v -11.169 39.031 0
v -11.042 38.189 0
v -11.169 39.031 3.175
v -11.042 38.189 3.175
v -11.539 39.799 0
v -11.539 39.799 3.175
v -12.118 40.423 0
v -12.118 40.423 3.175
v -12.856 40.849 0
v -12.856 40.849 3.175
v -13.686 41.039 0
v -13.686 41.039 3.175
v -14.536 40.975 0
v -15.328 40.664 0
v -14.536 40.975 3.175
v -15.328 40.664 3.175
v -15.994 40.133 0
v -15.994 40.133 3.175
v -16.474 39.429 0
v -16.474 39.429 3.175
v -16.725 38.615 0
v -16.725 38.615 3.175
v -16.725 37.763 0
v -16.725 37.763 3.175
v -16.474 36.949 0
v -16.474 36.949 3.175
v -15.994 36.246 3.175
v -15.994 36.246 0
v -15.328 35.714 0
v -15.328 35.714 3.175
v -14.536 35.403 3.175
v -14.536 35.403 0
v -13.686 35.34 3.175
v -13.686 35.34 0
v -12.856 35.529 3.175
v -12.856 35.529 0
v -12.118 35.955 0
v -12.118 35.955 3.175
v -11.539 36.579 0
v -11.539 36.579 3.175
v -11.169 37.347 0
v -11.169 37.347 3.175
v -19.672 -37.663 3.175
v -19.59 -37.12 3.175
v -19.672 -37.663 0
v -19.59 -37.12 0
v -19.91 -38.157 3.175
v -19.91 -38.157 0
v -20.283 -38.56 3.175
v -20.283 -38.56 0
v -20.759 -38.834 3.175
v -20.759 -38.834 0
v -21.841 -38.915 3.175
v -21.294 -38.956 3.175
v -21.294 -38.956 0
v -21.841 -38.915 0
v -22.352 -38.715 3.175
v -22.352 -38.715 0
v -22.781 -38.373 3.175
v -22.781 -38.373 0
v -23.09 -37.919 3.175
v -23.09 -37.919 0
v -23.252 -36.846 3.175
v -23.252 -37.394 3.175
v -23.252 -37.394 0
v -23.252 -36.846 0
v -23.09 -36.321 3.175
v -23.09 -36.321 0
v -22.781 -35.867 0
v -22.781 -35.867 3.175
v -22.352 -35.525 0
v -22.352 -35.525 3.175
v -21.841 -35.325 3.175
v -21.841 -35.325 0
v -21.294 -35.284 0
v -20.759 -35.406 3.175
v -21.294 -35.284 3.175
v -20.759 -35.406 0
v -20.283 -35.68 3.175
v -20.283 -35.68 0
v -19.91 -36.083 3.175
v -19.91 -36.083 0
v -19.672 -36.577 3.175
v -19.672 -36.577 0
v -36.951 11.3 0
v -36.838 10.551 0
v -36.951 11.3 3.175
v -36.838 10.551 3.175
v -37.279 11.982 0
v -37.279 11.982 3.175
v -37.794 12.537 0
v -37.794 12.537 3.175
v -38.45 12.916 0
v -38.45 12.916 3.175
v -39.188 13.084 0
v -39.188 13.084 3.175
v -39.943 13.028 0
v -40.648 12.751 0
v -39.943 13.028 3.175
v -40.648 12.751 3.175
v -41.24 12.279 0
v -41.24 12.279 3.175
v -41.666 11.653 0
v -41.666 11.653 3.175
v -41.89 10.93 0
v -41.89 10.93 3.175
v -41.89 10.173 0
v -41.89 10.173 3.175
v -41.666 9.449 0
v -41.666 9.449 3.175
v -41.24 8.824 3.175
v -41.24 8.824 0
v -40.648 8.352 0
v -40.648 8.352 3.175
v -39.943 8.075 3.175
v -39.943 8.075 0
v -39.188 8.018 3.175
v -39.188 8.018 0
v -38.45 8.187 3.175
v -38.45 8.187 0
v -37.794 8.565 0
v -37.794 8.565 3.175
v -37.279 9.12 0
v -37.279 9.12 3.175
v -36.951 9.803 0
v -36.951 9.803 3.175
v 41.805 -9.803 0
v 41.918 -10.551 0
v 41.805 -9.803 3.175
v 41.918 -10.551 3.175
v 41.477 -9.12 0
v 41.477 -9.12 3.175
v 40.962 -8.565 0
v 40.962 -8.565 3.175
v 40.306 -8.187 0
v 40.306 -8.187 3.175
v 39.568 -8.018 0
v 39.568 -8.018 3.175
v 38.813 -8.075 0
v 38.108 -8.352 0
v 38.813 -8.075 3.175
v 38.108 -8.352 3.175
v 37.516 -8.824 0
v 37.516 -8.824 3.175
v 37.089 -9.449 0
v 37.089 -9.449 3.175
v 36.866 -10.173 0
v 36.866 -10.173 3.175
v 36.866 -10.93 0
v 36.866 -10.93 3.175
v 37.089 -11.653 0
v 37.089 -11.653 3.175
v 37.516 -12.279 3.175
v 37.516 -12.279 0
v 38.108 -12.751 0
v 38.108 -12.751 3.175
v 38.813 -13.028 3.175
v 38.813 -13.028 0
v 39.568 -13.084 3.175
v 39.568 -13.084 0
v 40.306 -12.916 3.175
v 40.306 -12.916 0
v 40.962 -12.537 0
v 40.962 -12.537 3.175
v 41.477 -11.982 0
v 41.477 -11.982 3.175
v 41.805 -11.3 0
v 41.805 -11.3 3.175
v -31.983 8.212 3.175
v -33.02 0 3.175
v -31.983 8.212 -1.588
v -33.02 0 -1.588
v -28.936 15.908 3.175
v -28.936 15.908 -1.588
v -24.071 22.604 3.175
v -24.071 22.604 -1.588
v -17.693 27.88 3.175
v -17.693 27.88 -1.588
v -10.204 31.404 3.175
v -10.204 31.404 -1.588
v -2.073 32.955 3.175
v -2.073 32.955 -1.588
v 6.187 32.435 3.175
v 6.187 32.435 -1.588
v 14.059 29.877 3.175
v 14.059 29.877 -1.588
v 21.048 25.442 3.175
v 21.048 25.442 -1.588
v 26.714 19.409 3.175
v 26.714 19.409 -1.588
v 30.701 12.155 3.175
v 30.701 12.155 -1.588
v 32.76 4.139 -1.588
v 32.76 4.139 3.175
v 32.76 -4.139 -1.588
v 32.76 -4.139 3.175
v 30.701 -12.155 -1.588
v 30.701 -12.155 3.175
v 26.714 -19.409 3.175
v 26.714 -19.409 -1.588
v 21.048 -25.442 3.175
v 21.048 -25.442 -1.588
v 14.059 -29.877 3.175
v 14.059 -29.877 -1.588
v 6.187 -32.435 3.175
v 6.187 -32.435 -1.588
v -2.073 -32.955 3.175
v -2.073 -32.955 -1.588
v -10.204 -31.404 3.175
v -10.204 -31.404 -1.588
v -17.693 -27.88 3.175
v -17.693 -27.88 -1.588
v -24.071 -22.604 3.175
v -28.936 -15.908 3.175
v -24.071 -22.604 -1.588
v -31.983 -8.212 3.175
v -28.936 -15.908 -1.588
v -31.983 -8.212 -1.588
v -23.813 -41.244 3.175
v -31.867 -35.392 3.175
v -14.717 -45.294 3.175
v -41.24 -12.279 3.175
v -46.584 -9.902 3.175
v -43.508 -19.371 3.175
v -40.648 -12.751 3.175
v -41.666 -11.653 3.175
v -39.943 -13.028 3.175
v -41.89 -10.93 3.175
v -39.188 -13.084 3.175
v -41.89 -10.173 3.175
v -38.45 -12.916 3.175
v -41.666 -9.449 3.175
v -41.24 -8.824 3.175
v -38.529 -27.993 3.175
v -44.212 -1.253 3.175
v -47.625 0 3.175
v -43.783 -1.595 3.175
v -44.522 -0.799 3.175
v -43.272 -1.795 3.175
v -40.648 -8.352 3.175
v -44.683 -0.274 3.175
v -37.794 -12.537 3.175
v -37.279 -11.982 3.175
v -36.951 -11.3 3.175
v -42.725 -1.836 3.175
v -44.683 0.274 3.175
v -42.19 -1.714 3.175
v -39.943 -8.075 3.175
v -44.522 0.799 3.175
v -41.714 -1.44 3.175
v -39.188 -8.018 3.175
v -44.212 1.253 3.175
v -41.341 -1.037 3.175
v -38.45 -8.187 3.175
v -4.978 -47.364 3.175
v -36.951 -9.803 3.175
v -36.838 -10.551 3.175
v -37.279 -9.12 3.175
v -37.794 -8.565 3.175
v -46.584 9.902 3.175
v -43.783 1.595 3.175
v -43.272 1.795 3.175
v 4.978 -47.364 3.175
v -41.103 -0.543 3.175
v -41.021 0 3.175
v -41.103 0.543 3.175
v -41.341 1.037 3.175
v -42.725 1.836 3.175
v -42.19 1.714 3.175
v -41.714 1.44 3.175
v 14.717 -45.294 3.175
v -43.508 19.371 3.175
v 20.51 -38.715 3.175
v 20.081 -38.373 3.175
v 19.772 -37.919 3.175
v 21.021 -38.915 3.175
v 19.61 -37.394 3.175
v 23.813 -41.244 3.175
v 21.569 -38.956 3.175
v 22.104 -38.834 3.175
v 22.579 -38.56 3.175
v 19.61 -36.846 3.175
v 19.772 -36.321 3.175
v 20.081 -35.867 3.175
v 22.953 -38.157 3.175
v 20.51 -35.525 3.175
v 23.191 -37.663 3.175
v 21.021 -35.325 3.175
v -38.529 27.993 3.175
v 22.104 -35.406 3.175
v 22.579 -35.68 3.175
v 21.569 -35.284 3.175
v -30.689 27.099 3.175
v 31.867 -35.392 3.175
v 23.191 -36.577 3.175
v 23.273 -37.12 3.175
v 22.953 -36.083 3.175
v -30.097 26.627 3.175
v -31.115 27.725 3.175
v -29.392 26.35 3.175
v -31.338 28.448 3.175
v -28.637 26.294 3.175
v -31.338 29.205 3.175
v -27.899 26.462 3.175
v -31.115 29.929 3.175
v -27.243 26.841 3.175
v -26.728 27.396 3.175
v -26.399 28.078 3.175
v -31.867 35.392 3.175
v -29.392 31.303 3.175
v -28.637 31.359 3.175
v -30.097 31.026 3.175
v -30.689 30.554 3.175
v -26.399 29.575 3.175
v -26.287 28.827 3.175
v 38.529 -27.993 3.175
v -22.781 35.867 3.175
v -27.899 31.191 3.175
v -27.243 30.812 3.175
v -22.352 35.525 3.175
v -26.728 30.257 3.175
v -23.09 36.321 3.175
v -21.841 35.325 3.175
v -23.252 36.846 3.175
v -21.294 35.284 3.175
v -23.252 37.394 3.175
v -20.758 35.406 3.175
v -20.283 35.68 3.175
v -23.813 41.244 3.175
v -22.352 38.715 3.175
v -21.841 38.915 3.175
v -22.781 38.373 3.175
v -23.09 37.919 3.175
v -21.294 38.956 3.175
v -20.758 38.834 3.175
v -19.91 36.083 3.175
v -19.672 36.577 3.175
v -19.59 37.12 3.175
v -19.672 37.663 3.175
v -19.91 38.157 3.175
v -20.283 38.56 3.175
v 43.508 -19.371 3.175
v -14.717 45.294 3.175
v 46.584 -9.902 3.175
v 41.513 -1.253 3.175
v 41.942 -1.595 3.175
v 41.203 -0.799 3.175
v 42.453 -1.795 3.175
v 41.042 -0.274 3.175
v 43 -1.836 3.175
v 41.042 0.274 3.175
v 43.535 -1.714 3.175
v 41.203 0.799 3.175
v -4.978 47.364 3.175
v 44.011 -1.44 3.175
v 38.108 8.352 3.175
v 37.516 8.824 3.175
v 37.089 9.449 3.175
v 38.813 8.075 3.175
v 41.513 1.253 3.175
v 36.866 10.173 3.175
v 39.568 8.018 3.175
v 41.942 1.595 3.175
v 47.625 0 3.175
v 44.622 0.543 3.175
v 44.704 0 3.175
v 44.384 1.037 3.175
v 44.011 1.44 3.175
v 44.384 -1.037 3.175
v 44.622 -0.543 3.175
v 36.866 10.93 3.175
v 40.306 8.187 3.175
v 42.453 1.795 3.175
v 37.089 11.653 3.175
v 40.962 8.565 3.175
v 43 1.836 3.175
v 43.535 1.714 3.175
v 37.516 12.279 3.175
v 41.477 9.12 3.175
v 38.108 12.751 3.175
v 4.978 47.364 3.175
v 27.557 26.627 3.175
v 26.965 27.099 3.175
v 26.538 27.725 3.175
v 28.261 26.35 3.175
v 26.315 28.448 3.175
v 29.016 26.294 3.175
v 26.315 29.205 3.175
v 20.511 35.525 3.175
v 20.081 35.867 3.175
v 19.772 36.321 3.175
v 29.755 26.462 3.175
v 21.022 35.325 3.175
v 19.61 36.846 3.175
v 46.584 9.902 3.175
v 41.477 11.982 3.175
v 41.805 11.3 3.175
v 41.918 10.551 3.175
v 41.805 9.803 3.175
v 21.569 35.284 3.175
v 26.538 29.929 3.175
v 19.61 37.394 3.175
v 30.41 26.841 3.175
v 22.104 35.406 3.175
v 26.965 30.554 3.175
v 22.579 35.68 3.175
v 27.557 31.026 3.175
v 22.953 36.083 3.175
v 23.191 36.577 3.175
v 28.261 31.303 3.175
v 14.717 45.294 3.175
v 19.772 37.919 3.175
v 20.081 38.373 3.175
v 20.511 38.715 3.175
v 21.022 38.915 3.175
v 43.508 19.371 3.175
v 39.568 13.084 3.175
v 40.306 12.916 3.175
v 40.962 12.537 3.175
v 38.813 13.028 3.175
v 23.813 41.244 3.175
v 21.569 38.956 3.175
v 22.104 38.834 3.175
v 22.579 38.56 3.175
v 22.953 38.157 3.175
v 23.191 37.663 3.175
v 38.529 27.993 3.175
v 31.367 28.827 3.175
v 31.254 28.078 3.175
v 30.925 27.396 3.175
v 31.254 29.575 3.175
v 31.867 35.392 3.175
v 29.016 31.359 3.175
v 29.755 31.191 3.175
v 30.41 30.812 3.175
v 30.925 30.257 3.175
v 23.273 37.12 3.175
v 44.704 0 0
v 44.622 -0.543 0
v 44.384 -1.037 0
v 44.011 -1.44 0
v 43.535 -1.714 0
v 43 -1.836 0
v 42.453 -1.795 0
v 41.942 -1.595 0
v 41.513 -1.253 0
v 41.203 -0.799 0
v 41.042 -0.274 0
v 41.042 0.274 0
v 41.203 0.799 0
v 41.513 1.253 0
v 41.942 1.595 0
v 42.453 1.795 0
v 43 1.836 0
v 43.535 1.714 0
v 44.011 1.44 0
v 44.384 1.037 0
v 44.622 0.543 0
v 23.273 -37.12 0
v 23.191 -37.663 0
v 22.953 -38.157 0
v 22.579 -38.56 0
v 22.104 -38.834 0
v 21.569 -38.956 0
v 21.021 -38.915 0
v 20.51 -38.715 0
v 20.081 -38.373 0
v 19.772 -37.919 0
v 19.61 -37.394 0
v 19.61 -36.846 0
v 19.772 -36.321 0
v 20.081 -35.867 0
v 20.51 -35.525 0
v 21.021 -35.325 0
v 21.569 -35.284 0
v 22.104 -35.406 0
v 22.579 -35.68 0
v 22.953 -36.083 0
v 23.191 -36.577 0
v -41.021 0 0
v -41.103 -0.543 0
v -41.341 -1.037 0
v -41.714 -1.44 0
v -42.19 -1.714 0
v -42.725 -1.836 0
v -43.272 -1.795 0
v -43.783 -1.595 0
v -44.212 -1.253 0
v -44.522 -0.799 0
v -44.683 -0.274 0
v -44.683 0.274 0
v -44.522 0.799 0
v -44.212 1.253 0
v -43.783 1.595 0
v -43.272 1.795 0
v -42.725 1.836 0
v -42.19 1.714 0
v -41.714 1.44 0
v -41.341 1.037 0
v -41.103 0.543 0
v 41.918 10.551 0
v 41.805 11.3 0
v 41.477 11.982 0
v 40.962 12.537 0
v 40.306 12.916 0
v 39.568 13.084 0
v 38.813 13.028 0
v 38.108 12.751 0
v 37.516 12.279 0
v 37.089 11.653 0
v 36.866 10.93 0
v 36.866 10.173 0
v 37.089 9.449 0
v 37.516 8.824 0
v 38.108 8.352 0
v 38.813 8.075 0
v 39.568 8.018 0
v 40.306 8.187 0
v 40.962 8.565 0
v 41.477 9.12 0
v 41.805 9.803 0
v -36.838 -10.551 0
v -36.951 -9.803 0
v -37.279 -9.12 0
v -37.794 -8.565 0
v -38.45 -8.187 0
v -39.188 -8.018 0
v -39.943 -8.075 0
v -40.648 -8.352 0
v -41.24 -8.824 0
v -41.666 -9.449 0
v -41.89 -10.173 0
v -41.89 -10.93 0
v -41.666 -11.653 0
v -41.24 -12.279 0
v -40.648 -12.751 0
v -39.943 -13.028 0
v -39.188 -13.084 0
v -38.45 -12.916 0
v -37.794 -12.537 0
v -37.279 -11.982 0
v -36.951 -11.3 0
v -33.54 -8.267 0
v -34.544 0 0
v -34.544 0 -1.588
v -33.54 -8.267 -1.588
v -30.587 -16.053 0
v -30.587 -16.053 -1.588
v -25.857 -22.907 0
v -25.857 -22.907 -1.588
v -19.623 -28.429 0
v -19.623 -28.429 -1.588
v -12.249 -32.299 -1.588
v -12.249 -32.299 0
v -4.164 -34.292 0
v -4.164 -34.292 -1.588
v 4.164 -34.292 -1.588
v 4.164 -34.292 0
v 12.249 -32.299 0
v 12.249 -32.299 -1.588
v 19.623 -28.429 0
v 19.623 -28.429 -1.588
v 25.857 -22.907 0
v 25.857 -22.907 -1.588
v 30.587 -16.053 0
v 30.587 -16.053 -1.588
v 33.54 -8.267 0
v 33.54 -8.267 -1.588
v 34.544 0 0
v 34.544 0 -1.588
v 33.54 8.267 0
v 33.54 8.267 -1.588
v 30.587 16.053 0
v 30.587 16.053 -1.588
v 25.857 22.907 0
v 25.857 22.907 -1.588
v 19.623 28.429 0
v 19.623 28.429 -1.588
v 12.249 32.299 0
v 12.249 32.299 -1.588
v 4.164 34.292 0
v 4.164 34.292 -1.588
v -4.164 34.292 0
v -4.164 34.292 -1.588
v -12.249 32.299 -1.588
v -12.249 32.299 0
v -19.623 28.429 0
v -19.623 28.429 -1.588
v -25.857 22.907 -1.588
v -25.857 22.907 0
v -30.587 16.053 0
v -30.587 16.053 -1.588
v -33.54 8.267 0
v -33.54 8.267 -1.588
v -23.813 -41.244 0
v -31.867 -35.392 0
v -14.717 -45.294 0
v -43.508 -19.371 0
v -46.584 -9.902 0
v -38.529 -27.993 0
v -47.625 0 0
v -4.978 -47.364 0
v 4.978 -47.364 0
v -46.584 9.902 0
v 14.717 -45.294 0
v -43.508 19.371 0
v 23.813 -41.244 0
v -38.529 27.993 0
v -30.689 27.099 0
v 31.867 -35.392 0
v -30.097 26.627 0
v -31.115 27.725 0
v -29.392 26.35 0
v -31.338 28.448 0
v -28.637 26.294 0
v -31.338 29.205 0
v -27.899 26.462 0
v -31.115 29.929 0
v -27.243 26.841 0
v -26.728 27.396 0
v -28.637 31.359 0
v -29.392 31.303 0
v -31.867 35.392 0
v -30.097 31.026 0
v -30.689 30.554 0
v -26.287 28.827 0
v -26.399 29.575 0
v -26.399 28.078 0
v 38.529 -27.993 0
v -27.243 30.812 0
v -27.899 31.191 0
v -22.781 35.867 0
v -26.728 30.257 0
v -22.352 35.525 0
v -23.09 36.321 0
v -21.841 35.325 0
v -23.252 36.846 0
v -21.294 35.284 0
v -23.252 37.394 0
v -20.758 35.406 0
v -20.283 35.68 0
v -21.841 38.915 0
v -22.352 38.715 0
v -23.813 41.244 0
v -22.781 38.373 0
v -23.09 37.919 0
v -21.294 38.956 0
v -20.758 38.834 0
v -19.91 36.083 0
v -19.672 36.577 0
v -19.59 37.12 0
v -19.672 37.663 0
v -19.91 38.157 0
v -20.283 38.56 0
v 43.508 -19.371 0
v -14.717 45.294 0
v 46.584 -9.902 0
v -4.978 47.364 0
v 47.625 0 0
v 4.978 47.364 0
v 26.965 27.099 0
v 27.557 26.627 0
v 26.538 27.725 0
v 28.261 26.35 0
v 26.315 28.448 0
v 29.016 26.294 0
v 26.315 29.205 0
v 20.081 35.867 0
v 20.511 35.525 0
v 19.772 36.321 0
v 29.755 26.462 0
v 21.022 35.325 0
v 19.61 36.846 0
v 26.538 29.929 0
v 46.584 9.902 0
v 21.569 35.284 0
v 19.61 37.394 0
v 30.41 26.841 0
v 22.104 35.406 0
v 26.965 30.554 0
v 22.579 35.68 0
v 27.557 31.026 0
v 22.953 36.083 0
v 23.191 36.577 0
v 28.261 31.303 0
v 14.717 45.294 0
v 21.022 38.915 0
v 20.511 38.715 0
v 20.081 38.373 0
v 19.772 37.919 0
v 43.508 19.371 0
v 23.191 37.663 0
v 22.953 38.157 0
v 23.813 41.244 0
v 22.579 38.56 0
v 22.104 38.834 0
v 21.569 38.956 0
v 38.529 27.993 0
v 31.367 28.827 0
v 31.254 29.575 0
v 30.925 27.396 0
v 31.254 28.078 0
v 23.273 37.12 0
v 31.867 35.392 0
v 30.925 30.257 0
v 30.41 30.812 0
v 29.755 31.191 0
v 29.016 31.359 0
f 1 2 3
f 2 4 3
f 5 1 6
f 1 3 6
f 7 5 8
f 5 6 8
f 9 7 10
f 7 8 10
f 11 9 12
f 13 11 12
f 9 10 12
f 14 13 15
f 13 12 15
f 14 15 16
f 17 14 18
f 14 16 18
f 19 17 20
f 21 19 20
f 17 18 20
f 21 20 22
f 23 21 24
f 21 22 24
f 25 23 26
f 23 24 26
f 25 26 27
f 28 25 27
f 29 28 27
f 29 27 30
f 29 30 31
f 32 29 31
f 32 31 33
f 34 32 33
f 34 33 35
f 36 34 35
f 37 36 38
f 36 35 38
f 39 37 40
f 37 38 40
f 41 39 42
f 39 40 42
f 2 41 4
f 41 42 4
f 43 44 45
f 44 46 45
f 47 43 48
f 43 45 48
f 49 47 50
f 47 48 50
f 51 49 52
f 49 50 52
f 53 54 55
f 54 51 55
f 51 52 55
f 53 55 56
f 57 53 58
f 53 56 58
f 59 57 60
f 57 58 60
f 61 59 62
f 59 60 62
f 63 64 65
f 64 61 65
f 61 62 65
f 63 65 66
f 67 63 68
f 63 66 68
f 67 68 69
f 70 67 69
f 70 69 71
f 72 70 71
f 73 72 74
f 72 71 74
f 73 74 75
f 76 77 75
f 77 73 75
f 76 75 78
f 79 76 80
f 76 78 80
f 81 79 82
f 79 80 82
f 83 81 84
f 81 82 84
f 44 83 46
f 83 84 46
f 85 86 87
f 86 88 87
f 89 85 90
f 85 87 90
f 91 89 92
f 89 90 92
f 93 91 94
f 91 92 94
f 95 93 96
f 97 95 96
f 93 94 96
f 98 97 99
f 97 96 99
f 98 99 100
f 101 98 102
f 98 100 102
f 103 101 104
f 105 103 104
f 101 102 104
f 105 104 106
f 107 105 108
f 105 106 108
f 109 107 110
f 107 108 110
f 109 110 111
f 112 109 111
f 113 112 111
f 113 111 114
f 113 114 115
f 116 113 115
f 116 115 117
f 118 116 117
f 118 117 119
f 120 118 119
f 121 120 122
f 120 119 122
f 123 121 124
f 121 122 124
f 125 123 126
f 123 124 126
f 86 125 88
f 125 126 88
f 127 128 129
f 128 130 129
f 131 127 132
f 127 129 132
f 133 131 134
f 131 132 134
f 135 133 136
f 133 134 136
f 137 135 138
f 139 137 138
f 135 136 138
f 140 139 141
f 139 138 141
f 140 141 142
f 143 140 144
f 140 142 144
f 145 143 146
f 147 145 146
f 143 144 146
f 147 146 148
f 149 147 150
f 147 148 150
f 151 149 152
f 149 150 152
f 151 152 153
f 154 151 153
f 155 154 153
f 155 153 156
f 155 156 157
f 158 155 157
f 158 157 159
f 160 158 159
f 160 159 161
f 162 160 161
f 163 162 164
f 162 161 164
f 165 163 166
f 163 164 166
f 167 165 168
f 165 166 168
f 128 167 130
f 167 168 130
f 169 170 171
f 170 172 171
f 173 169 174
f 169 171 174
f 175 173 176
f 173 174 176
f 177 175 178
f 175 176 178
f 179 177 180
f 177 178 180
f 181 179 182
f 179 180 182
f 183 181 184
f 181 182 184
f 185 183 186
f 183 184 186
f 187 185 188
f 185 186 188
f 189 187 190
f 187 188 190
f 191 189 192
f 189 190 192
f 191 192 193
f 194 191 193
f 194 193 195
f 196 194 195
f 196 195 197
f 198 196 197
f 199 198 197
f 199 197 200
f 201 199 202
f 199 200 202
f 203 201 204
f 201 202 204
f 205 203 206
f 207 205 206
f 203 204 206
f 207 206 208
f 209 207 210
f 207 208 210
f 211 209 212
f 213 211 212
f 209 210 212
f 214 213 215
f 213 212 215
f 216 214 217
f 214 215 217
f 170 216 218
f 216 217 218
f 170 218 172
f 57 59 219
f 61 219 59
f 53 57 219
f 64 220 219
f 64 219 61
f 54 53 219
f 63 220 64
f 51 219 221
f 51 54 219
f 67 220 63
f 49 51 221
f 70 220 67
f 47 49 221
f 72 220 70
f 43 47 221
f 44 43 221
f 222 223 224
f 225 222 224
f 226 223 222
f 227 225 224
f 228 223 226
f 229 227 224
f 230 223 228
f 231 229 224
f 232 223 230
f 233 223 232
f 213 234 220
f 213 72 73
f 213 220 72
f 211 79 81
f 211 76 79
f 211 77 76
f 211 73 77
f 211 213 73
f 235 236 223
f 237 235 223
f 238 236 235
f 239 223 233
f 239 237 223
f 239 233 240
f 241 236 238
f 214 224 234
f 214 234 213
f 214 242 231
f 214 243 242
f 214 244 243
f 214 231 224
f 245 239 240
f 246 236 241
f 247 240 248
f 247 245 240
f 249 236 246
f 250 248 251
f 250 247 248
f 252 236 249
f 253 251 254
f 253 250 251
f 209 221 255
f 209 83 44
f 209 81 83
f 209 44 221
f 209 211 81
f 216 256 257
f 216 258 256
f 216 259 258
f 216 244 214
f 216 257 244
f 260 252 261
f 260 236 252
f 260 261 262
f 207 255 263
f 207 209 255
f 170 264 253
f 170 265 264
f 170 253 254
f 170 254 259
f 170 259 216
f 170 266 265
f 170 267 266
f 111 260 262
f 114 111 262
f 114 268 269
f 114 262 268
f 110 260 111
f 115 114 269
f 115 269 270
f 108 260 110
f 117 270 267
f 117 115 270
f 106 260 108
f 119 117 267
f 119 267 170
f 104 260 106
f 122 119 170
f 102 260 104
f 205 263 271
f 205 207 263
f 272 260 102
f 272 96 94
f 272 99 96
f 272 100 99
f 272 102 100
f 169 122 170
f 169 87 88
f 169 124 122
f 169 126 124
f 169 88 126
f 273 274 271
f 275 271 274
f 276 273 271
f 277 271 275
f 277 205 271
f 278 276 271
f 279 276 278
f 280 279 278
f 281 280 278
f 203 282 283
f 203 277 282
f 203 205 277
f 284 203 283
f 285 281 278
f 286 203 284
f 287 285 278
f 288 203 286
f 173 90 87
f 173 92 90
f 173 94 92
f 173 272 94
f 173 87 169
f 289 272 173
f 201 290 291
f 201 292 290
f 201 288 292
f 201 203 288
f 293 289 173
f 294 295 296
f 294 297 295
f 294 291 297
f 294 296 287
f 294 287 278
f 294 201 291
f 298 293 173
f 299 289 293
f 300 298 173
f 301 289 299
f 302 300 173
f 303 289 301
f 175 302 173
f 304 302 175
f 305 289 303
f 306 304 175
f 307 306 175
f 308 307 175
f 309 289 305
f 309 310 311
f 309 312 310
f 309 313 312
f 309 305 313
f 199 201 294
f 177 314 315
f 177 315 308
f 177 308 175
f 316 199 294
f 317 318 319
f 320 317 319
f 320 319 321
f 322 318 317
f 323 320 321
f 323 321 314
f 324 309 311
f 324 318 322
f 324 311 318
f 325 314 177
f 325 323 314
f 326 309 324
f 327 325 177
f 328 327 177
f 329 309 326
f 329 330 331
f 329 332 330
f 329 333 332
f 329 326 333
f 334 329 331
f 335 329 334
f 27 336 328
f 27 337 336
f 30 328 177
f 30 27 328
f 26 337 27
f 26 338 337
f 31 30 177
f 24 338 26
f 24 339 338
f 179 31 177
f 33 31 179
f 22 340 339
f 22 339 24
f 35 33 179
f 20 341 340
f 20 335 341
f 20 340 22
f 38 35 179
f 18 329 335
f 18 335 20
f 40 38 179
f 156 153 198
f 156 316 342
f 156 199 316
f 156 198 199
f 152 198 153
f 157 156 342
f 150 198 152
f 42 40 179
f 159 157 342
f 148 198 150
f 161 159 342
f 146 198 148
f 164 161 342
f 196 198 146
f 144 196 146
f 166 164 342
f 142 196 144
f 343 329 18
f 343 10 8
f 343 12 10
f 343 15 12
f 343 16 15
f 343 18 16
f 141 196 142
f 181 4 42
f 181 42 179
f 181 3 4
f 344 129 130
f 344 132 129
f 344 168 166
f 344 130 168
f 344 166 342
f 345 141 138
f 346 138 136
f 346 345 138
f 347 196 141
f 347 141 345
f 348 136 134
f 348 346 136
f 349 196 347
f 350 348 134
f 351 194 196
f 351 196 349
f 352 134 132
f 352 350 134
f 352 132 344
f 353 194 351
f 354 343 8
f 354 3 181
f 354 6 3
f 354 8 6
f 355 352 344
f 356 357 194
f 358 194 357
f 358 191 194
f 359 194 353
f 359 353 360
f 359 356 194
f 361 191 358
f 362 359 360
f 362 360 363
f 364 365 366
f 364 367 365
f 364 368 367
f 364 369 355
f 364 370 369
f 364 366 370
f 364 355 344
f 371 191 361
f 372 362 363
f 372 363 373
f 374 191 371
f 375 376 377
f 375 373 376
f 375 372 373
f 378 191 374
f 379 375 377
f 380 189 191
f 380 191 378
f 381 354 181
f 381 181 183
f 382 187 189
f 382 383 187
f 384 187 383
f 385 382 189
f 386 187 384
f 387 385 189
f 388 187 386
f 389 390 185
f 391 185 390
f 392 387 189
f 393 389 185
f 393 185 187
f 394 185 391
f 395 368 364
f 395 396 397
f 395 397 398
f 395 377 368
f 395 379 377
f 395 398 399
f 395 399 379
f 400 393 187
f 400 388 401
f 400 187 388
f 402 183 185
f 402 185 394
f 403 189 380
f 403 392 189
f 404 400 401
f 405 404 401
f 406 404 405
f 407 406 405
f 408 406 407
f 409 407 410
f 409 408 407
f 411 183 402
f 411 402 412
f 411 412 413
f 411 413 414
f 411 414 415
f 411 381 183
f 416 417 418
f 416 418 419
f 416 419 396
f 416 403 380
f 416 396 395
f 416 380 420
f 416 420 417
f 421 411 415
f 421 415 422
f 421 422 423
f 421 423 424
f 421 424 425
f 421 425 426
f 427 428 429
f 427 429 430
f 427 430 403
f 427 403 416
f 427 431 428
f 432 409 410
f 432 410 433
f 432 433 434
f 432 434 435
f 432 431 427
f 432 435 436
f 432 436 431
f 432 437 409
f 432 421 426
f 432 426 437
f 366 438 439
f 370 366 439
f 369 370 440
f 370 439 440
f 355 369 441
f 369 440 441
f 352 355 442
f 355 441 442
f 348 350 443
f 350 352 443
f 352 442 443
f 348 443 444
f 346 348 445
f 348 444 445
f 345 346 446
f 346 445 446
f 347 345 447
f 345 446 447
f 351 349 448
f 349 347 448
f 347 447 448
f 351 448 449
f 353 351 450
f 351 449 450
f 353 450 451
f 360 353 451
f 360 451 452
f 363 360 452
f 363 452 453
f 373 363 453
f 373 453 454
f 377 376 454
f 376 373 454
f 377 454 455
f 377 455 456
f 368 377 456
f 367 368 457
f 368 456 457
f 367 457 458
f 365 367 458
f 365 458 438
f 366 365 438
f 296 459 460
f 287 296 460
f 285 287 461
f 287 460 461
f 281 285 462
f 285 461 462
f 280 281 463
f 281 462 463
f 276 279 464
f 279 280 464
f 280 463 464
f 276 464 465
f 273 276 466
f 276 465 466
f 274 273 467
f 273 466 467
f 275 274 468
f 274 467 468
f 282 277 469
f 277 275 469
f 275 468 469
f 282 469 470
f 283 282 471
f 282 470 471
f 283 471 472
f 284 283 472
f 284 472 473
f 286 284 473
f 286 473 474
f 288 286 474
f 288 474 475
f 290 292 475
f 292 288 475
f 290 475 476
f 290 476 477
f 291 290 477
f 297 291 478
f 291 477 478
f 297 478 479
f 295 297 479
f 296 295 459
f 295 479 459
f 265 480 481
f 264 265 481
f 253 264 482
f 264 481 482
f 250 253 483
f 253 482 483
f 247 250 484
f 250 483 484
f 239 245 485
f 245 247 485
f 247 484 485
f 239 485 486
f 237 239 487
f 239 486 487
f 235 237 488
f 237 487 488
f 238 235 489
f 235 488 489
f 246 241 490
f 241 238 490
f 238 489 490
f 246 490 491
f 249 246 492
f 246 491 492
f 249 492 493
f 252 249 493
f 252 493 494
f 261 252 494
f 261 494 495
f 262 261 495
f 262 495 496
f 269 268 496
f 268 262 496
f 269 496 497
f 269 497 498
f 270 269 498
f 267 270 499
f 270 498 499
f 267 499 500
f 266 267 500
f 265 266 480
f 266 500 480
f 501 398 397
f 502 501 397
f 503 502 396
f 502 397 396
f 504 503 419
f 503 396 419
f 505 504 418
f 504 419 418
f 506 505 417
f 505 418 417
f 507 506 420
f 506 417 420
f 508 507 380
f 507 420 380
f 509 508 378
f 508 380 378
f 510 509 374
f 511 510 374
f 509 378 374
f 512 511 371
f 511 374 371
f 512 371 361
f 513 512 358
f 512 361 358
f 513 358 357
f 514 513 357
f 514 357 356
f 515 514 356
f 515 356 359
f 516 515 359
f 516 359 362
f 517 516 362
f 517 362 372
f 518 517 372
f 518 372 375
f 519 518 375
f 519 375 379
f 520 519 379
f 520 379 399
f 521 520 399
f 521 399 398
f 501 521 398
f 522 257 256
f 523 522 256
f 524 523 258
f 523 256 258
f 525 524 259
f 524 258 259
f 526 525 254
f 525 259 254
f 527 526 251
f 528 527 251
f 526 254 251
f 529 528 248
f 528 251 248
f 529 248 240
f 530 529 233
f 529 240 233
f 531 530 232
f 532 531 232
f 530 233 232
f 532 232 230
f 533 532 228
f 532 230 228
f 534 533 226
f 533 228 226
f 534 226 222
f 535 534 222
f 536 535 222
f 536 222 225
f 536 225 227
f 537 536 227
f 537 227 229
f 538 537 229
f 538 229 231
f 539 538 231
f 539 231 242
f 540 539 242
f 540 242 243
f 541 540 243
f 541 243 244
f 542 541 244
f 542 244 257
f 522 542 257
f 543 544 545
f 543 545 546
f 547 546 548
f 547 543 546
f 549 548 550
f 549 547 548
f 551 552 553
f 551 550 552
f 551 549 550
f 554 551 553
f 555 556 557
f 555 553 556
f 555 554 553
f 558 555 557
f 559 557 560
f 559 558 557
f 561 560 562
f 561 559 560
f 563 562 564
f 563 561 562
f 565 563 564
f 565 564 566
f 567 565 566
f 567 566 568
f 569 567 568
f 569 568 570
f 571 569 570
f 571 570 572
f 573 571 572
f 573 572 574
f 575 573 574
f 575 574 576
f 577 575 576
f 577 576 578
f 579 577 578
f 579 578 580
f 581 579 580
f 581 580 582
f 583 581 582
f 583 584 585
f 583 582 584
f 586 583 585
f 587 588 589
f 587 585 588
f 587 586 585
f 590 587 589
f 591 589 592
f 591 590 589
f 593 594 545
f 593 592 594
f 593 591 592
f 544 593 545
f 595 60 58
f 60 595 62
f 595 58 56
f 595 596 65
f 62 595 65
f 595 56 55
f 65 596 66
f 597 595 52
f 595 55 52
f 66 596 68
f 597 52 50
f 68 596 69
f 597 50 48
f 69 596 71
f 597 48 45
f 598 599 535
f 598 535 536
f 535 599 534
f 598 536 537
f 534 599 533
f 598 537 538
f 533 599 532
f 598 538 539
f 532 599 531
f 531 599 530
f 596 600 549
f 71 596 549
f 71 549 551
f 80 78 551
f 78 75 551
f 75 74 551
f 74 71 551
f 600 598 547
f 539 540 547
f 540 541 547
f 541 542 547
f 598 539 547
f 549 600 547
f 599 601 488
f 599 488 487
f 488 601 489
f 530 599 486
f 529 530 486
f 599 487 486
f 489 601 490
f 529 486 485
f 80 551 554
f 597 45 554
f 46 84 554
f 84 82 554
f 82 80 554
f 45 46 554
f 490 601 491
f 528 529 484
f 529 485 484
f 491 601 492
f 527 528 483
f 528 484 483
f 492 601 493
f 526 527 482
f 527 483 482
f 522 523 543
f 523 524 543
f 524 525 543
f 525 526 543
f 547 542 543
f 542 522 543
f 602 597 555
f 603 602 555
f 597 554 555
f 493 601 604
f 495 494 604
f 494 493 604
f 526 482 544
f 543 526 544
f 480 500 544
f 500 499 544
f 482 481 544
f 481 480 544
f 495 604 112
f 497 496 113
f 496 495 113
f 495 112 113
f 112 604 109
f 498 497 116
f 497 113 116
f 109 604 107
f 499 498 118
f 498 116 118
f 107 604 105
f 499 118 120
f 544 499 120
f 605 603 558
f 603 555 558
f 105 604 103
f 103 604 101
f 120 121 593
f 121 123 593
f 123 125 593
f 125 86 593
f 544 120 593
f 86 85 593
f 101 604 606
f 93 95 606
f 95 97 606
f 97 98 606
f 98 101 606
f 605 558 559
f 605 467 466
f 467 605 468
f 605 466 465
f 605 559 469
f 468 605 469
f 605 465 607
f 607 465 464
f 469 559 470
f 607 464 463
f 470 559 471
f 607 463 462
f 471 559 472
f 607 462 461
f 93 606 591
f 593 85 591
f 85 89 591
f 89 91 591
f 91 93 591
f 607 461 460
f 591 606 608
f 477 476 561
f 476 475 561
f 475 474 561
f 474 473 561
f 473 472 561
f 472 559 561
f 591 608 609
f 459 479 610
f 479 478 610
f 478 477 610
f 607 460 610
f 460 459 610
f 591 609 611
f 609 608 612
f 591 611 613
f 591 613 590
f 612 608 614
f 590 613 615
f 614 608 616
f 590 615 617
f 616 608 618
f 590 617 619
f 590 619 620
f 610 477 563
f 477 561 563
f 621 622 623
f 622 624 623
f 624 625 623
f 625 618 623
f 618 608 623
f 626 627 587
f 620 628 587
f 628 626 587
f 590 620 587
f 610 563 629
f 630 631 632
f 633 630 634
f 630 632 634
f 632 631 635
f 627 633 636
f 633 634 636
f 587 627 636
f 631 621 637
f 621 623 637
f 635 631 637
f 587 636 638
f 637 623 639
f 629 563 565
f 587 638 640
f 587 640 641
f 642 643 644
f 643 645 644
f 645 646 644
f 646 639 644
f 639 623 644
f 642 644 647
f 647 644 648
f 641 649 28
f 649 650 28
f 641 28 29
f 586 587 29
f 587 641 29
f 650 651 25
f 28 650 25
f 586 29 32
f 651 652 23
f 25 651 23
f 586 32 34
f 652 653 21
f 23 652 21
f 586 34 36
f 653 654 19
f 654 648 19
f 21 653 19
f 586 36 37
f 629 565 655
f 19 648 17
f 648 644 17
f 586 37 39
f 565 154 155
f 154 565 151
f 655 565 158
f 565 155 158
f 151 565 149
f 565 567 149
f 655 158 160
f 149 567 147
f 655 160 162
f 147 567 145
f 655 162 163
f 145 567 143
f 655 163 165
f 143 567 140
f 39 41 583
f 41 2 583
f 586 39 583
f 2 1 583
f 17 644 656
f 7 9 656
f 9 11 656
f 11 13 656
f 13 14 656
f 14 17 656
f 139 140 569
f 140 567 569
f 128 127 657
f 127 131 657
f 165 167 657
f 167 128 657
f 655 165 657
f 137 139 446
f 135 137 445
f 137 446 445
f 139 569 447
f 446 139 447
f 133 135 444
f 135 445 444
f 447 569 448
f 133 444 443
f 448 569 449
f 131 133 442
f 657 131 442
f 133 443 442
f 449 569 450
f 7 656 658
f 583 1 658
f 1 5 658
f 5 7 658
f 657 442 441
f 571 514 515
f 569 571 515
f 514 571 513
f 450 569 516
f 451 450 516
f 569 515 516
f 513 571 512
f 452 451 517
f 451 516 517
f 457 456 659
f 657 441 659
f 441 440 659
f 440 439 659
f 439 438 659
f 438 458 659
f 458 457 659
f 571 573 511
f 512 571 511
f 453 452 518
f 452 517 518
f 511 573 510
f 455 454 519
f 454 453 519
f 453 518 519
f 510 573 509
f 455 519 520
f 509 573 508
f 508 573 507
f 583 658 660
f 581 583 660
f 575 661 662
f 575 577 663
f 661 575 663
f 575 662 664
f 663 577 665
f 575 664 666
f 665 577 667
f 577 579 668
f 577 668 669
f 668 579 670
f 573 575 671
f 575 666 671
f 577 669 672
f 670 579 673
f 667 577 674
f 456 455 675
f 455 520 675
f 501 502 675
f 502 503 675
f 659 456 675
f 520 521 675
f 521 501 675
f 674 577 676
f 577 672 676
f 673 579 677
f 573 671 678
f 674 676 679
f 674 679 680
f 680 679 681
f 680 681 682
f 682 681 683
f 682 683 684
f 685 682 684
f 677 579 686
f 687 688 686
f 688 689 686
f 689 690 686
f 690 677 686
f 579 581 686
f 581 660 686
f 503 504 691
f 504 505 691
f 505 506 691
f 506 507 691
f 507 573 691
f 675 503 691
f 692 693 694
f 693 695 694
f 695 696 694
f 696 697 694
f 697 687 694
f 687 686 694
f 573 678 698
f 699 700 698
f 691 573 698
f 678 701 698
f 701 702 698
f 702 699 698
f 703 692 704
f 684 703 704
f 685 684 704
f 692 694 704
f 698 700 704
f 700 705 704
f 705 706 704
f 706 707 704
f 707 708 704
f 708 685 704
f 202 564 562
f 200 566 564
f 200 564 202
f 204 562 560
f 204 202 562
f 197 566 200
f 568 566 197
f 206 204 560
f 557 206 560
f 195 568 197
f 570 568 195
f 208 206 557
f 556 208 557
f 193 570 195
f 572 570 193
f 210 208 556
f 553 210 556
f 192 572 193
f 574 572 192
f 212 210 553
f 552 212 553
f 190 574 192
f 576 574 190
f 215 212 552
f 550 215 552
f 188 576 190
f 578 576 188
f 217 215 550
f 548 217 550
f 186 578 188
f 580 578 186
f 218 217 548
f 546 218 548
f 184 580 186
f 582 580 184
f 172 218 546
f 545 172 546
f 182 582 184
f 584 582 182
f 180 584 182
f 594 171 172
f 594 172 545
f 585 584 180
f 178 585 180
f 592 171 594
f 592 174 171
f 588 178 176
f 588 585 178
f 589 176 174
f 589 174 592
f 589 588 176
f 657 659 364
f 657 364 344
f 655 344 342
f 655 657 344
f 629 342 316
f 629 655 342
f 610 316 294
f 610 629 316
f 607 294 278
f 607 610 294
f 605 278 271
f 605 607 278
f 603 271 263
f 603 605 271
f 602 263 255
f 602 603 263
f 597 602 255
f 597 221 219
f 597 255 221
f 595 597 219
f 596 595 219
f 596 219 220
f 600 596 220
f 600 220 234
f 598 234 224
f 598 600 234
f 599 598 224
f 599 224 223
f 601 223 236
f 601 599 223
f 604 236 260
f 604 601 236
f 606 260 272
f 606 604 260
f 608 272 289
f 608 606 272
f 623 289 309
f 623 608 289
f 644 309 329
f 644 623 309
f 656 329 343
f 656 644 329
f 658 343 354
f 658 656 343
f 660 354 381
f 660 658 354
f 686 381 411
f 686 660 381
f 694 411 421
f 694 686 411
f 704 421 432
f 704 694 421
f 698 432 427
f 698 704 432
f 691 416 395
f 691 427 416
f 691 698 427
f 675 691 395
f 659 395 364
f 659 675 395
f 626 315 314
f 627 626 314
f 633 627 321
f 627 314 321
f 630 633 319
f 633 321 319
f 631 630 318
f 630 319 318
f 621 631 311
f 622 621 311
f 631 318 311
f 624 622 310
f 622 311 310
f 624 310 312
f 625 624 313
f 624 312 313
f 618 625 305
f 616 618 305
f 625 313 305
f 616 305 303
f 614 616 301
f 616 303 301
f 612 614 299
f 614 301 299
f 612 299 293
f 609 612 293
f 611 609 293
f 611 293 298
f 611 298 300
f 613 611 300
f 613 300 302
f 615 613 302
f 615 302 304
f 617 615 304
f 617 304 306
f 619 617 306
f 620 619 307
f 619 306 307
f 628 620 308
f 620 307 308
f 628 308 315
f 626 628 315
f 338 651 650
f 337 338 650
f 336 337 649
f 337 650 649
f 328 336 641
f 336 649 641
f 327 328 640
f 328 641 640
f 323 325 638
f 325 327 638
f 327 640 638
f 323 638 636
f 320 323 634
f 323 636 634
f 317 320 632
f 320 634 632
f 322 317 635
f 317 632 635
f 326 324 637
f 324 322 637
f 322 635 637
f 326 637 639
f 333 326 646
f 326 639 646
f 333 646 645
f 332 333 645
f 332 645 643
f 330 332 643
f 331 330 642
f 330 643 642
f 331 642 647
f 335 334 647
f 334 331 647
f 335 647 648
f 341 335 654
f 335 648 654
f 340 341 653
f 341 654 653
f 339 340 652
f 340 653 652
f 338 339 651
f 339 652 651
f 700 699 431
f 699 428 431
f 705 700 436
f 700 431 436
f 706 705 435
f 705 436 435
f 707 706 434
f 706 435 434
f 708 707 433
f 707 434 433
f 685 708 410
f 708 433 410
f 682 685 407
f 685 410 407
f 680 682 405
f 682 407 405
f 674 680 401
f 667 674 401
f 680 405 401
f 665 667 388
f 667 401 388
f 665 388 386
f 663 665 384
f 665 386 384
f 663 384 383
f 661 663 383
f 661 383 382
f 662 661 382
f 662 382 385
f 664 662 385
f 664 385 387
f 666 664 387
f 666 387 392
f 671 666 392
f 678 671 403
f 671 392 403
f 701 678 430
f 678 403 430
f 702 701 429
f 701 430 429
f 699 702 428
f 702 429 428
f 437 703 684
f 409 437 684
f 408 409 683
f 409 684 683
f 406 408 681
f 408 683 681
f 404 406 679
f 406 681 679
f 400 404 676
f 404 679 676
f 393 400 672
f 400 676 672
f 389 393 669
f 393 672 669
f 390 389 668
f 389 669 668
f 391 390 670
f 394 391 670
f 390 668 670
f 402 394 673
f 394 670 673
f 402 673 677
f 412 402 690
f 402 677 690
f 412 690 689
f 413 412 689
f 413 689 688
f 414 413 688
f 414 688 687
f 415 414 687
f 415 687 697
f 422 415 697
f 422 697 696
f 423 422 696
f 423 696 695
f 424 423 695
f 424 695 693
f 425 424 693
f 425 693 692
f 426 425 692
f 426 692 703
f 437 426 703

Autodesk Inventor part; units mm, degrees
ref_plane "YZ Plane" through (0, 0, 0) normal (1, 0, 0) x (0, 1, 0)
ref_plane "XZ Plane" through (0, 0, 0) normal (0, 1, 0) x (-1, 0, 0)
ref_plane "XY Plane" through (0, 0, 0) normal (0, 0, 1) x (1, 0, 0)
sketch "Sketch1" plane through (0, 0, 0) normal (0, 0, 1) x (1, 0, 0)
  circle A0 centre (0, 0) radius 47.625
  line L0 (0, 0) -> (21.4313, 37.12)
  line L1 (0, 0) -> (42.8625, 0) construction
  circle A1 centre (21.4313, 37.12) radius 1.8415
  circle A2 centre (-21.4312, 37.12) radius 1.8415
  circle A3 centre (-42.8625, 0) radius 1.8415
  circle A4 centre (-21.4313, -37.12) radius 1.8415
  circle A5 centre (21.4312, -37.12) radius 1.8415
  circle A6 centre (42.8625, 0) radius 1.8415
  dimension "d0" = 95.25
  dimension "d1" = 42.8625
  dimension "d2" = 60
  dimension "d3" = 3.683
  dimension "d6" = 360
extrude "Extrusion1" add sketch "Sketch1" along normal blind 3.175
sketch "Sketch3" plane through (0, 0, 0) normal (0, 0, -1) x (-1, 0, 0)
  circle A0 centre (0, 0) radius 41.275
  circle A1 centre (0, 0) radius 34.544
  dimension "d10" = 82.55
  dimension "d11" = 69.088
extrude "Extrusion2" add sketch "Sketch3" along normal blind 1.5875 contours A1
sketch "Sketch6" plane through (0, 0, -1.5875) normal (0, 0, -1) x (-1, 0, 0)
  circle A0 centre (0, 0) radius 33.02
  dimension "d27" = 66.04
extrude "Extrusion4" cut sketch "Sketch6" against normal blind 25.4
sketch "Sketch8" plane through (0, 0, 3.175) normal (0, 0, 1) x (1, 0, 0)
  line L0 (0, 0) -> (39.3779, 10.5513)
  line L1 (0, 0) -> (40.767, 0) construction
  circle A0 centre (39.3779, 10.5513) radius 2.54
  line L2 (0, 0) -> (0, 8.7749)
  circle A1 centre (39.3779, -10.5513) radius 2.54
  circle A2 centre (-39.3779, 10.5513) radius 2.54
  circle A3 centre (-39.3779, -10.5513) radius 2.54
  circle A4 centre (21.4313, 37.12) radius 1.8415 projected
  line L3 (21.4313, 37.12) -> (0, 0)
  circle A5 centre (28.8266, 28.8266) radius 2.54
  line L4 (28.8266, 28.8266) -> (0, 0)
  circle A6 centre (-28.8266, 28.8266) radius 2.54
  dimension "d30" = 40.767
  dimension "d31" = 15
  dimension "d32" = 5.08
  dimension "d35" = 15
  dimension "d36" = 40.767
  dimension "d37" = 5.08
extrude "Extrusion5" cut sketch "Sketch8" against normal blind 25.4 contours A0 | A1 | A2 | A3
extrude "Extrusion6" cut sketch "Sketch8" against normal blind 25.4 contours A5 | A6
sketch "Sketch10" plane through (0, 0, 3.175) normal (0, 0, 1) x (1, 0, 0)
  line L0 (0, 0) -> (-13.8997, 38.1891) construction
  line L1 (0, 0) -> (40.64, 0) construction
  circle A0 centre (-13.8997, 38.1891) radius 2.8575
  dimension "d44" = 40.64
  dimension "d45" = 110
  dimension "d46" = 5.715
extrude "Extrusion8" cut sketch "Sketch10" against normal through all
sketch "Sketch9" plane through (0, 0, 3.175) normal (0, 0, 1) x (1, 0, 0)
  circle A0 centre (0, 0) radius 47.625
  circle A1 centre (0, 0) radius 47.117
  dimension "d40" = 95.25
  dimension "d41" = 94.234
extrude "PRINT_FEATURE_1" [suppressed]
equation "\"d35\" = d31"
equation "\"d36\" = d30"
equation "\"d37\" = d32"
properties part number "forwardBallastSealingWallRear" material "ABS Plastic"
